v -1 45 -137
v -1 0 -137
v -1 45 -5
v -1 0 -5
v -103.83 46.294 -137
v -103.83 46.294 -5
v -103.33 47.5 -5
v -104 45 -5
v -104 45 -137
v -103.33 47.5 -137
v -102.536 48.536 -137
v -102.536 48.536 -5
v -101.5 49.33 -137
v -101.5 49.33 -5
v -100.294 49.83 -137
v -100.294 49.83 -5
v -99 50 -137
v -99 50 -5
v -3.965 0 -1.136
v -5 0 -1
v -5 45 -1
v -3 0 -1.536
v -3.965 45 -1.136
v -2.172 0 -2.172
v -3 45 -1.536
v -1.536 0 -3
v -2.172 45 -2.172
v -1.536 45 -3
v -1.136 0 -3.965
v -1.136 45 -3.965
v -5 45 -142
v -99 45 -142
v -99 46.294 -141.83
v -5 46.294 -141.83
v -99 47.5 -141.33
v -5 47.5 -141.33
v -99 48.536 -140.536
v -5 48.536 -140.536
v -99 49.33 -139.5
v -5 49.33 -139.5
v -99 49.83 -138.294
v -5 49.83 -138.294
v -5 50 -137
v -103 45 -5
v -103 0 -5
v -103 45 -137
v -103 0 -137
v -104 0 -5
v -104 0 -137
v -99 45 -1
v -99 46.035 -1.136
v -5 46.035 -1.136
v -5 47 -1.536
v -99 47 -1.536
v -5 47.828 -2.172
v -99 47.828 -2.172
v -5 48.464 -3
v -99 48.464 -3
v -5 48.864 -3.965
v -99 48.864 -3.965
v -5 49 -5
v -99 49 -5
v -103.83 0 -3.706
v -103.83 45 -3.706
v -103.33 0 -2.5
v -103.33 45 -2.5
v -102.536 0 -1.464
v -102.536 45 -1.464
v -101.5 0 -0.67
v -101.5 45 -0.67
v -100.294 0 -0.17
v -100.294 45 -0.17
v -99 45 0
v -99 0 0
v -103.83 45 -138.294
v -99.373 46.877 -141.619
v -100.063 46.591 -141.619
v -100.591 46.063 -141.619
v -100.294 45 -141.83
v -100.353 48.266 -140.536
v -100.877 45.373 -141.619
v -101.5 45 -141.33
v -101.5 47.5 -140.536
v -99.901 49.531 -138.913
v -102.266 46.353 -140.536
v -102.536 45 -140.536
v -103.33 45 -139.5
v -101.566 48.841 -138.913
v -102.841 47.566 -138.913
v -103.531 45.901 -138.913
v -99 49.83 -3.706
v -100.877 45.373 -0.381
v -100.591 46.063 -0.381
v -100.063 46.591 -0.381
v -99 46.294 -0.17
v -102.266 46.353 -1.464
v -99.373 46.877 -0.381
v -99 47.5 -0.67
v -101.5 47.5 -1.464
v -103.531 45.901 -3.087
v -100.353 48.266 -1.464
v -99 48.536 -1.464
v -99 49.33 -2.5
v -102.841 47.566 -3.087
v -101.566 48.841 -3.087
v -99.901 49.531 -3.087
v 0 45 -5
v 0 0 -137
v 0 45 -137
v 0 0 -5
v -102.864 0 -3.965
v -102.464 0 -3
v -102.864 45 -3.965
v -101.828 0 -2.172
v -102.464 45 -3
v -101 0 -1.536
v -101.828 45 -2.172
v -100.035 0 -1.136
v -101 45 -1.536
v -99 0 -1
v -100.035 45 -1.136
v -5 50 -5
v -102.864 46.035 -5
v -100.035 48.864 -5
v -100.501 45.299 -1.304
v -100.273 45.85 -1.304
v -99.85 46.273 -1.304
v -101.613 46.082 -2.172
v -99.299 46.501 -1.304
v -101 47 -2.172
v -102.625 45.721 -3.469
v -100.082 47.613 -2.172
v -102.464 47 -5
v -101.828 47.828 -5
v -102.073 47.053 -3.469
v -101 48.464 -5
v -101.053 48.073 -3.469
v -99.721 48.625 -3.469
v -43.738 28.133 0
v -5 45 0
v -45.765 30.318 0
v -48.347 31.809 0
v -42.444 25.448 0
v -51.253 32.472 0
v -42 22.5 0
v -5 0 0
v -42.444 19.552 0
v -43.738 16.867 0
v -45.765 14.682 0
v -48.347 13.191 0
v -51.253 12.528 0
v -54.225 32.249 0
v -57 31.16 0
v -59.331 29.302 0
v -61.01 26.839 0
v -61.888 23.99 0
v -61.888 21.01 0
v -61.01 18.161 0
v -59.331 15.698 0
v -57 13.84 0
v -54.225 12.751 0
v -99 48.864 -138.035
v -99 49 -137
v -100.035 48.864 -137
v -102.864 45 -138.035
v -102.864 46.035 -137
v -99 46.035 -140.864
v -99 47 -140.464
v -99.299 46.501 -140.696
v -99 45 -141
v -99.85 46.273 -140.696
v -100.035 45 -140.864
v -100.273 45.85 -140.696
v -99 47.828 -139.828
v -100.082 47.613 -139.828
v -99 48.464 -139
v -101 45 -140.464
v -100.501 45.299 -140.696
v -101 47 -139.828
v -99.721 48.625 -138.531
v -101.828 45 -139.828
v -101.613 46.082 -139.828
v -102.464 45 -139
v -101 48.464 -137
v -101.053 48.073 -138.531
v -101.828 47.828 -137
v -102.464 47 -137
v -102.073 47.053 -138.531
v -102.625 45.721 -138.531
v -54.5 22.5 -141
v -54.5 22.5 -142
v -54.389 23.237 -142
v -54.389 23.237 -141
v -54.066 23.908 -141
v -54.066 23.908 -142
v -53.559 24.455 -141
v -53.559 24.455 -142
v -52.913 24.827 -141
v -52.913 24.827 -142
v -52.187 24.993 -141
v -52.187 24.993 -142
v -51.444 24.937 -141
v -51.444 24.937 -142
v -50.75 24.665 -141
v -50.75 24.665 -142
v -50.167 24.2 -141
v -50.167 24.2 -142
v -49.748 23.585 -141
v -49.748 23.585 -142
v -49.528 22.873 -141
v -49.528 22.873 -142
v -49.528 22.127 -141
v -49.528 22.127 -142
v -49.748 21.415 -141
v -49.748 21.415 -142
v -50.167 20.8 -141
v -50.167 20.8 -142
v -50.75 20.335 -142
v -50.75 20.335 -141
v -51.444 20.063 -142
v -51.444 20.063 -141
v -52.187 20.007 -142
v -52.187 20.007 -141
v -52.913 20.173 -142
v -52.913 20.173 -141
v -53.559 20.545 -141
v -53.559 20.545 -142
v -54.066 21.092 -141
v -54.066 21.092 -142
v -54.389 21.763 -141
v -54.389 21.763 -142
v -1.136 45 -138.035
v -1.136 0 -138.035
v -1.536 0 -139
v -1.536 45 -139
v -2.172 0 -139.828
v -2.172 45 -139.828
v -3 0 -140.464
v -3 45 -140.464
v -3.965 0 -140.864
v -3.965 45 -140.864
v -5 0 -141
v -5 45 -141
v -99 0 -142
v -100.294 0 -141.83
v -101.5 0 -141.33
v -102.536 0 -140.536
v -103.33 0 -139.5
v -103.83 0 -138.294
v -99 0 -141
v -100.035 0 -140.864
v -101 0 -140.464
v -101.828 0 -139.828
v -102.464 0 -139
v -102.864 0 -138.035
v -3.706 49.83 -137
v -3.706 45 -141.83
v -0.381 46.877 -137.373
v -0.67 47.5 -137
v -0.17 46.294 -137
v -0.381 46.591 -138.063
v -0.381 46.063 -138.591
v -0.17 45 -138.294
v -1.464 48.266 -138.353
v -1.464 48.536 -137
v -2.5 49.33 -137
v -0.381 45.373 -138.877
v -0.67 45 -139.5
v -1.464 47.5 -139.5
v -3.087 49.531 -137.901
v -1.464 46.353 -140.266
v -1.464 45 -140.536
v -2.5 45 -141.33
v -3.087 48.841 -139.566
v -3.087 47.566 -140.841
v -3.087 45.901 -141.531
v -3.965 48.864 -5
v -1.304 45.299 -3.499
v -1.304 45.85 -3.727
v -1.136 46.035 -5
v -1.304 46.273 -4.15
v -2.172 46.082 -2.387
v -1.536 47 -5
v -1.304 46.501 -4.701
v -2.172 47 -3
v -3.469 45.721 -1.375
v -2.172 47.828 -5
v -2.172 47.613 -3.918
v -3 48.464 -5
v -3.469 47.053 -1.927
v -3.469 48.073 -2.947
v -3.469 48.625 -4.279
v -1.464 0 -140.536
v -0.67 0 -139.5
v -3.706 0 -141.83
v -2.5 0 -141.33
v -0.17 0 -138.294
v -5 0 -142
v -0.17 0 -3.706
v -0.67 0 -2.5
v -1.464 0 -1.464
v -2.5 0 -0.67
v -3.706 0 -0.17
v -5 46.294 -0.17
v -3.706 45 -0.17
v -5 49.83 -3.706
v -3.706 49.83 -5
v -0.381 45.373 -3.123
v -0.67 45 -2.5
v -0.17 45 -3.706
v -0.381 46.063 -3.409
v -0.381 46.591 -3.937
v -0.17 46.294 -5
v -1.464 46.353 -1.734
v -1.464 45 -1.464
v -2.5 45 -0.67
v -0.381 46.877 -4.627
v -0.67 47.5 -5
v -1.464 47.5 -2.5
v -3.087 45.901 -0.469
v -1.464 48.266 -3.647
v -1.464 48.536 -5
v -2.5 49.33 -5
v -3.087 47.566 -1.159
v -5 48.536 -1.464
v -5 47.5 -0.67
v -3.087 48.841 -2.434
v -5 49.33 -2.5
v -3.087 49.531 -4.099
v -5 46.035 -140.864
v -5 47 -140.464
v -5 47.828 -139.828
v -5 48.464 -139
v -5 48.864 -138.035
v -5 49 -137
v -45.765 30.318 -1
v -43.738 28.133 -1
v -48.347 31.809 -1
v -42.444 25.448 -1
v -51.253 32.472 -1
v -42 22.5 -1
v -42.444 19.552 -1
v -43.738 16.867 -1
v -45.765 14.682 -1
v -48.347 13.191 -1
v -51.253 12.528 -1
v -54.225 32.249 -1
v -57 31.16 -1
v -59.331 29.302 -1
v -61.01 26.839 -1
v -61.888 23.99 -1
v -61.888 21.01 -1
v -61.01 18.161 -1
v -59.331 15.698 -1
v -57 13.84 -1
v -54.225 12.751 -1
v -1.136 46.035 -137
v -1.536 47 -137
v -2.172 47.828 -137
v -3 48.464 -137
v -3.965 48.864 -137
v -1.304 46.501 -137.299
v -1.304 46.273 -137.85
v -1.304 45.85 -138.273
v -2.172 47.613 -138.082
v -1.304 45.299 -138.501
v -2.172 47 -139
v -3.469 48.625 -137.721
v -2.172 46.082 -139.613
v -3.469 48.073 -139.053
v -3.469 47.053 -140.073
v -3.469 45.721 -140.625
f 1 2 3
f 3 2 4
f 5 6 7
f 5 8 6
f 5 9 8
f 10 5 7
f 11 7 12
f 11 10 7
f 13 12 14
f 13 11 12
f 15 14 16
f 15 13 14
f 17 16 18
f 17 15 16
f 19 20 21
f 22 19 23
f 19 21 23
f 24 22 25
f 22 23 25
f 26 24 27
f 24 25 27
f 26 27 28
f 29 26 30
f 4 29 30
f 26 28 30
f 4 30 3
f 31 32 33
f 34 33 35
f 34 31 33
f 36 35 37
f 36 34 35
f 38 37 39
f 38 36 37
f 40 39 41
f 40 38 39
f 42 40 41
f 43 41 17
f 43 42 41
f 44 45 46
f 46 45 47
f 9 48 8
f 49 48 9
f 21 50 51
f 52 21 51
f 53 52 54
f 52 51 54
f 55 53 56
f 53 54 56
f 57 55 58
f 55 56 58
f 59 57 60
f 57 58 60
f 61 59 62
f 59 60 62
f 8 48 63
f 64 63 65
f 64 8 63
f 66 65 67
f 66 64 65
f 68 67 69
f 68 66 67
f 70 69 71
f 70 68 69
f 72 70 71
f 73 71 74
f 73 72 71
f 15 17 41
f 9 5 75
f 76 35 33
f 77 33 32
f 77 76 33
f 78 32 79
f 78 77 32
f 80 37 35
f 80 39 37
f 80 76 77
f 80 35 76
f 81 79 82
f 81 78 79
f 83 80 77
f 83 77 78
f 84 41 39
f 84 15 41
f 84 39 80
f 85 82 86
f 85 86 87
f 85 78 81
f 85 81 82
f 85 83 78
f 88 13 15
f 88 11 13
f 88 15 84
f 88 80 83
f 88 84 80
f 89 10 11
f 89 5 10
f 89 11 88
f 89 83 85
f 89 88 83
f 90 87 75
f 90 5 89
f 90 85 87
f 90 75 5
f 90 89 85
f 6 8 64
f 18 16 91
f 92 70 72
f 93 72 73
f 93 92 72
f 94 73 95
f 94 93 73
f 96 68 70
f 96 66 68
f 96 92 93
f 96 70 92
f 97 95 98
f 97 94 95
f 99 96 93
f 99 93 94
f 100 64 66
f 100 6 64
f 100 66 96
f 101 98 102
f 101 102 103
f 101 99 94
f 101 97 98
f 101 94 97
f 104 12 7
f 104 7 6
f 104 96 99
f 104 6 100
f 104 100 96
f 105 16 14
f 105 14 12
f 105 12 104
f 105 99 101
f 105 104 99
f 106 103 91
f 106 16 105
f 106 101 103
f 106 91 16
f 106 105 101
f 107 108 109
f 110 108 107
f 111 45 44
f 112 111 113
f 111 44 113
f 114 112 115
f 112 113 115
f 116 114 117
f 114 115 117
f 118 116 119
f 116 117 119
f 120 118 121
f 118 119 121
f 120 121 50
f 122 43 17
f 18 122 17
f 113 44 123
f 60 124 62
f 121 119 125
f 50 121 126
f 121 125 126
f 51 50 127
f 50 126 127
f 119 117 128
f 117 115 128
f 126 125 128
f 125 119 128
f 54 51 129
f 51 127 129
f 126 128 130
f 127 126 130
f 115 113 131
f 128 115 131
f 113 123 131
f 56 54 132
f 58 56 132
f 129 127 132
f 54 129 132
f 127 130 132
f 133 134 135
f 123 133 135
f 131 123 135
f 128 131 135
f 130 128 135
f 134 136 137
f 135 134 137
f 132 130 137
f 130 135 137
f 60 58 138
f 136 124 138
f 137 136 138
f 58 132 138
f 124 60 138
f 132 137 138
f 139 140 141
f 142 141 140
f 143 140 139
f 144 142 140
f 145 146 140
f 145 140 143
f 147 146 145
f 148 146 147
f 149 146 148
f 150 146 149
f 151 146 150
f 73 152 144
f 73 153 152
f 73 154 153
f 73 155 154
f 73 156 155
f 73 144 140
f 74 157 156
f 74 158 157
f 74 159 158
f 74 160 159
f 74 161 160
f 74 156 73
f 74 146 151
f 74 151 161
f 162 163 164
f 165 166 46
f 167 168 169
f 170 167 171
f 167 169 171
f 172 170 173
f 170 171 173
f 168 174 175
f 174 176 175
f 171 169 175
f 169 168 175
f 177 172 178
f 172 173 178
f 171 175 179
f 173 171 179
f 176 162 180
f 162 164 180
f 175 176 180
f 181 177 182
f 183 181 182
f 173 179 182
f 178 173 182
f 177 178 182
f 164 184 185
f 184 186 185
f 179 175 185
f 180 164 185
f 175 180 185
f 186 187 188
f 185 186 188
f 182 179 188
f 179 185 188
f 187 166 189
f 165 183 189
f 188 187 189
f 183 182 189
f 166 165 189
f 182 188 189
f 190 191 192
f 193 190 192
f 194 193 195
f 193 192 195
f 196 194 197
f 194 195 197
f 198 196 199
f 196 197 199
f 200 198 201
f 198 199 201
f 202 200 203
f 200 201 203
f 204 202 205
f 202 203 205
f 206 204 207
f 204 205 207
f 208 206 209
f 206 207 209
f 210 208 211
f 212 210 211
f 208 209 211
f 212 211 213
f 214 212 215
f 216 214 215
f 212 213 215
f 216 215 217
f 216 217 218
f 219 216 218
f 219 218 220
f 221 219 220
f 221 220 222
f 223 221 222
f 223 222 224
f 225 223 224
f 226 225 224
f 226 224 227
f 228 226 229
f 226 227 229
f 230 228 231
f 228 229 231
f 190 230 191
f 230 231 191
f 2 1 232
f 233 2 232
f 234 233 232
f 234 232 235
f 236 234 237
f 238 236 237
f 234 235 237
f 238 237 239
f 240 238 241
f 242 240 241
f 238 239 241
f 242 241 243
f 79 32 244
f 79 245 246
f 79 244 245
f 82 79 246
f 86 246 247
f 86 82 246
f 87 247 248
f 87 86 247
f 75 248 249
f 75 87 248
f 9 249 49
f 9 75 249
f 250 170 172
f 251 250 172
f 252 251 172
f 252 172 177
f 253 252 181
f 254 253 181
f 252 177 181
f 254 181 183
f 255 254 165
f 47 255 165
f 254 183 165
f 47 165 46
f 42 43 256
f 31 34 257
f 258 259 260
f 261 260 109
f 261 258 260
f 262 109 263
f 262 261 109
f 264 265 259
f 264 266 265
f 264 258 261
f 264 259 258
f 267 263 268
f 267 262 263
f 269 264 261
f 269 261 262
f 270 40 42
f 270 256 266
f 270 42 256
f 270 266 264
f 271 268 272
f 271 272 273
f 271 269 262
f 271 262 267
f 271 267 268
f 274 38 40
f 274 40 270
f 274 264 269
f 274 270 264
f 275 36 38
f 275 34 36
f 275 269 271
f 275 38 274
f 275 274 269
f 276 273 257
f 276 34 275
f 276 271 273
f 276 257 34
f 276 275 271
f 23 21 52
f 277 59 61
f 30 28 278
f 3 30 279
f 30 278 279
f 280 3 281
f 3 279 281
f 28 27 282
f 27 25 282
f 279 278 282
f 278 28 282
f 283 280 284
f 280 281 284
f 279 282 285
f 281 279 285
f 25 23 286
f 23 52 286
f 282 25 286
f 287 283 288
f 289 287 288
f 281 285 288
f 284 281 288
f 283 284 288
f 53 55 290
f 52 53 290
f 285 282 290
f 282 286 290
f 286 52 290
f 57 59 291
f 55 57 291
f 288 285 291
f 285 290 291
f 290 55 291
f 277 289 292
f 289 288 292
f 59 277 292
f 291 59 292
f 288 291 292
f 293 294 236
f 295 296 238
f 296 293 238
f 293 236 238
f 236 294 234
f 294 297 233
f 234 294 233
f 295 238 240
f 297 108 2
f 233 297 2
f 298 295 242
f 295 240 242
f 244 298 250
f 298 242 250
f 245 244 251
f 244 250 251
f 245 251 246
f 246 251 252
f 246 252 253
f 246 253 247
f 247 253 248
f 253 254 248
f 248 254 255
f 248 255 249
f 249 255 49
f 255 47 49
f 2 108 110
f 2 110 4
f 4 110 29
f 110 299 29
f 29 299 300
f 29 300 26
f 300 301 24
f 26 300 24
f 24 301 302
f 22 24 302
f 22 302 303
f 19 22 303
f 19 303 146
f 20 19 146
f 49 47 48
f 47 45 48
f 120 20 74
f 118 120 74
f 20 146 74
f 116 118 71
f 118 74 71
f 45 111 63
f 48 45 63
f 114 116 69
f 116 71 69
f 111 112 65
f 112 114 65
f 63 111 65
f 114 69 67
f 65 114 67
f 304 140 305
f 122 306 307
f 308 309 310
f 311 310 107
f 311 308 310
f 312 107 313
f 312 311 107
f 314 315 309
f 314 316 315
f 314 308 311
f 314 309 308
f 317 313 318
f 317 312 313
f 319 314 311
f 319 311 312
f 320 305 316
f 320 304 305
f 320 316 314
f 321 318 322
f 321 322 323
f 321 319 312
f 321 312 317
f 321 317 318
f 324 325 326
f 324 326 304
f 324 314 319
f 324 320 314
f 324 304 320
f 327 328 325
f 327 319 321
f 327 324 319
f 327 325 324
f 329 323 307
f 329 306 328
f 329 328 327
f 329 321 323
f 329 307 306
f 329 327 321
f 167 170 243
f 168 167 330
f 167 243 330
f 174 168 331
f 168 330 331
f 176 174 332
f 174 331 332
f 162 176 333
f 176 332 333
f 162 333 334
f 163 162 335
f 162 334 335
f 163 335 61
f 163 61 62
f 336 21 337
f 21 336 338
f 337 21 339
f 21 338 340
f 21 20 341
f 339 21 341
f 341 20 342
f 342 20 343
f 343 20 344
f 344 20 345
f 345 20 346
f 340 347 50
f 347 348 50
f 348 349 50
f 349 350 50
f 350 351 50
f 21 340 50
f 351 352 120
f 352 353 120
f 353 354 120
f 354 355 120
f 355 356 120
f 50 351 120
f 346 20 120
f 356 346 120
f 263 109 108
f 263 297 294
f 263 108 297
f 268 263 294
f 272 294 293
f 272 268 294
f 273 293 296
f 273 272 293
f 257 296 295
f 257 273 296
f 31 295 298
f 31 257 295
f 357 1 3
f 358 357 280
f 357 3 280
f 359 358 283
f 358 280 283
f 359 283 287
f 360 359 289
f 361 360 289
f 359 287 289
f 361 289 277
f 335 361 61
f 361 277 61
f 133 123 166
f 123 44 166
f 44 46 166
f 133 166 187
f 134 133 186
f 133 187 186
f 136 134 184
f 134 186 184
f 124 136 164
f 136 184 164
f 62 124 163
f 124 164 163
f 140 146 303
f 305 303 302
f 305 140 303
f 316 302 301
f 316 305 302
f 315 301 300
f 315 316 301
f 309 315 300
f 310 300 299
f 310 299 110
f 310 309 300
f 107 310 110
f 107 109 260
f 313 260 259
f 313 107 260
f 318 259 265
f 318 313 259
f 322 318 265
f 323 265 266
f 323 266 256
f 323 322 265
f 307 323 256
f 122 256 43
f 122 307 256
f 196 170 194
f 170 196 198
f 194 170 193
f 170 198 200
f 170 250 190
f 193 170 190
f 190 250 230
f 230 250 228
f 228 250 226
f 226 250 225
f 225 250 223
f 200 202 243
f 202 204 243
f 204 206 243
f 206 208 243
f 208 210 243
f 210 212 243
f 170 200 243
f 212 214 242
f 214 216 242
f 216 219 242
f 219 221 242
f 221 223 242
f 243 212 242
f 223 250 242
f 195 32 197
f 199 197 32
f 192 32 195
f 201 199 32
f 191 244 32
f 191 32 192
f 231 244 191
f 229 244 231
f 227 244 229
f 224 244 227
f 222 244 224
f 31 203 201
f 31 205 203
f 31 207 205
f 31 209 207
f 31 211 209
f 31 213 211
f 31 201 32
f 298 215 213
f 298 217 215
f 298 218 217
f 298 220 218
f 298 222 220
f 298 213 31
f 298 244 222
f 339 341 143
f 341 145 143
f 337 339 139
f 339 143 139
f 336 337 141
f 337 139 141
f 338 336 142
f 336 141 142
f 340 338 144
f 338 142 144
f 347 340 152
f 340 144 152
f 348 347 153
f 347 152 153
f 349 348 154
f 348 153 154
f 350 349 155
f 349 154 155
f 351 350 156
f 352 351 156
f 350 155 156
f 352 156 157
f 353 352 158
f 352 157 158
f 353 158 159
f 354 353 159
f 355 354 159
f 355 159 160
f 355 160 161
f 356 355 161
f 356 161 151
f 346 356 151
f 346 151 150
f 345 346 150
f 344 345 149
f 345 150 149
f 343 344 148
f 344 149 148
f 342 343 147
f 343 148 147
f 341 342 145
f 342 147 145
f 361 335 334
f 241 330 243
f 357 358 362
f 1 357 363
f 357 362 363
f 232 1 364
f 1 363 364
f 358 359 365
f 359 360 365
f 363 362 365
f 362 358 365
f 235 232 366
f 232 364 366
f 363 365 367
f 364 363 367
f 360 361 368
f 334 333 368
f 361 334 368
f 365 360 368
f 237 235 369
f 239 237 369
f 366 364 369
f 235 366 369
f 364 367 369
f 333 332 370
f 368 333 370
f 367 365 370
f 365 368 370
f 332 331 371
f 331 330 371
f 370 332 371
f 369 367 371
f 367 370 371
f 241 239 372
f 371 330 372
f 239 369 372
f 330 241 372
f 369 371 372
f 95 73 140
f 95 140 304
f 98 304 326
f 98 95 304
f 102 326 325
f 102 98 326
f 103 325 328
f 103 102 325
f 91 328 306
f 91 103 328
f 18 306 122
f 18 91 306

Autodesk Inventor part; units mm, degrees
ref_plane "YZ Plane" through (0, 0, 0) normal (1, 0, 0) x (0, 1, 0)
ref_plane "XZ Plane" through (0, 0, 0) normal (0, 1, 0) x (-1, 0, 0)
ref_plane "XY Plane" through (0, 0, 0) normal (0, 0, 1) x (1, 0, 0)
sketch "Sketch1" plane through (0, 0, 0) normal (0, 1, 0) x (-1, 0, 0)
  line L0 (0, 0) -> (104, 0)
  line L1 (104, 0) -> (104, -142)
  line L2 (104, -142) -> (0, -142)
  line L3 (0, -142) -> (0, 0)
  dimension "d0" = 142
  dimension "d1" = 104
extrude "Extrusion1" add sketch "Sketch1" along normal blind 50
fillet "Fillet1" radius 5 8 edges at (-104, 50, -71) (-52, 50, 0) (-52, 50, -142) (0, 50, -71) (0, 25, 0) (0, 25, -142) (-104, 25, 0) (-104, 25, -142)
shell "Shell1" thickness 1 removed faces 1 at (-34.6667, 0, -93)
sketch "Sketch2" plane through (-99, 0, 0) normal (0, 0, 1) x (1, 0, 0)
  line L0 (94, 45) -> (94, 0) projected
  line L1 (0, 45) -> (94, 45) projected
  line L2 (0, 0) -> (0, 45) projected
  line L3 (0, 0) -> (94, 0) projected
  circle A0 centre (47, 22.5) radius 10
  point P0 (99, 0)
  dimension "d6" = 20
extrude "Extrusion2" cut sketch "Sketch2" against normal blind 50 contours A0
sketch "Sketch3" plane through (-5, 0, -142) normal (0, 0, -1) x (-1, 0, 0)
  line L0 (0, 0) -> (0, 45) projected
  line L1 (0, 0) -> (94, 0) projected
  line L2 (94, 45) -> (94, 0) projected
  line L3 (0, 45) -> (94, 45) projected
  circle A0 centre (47, 22.5) radius 2.5
  point P0 (-5, 0)
  dimension "d9" = 5
extrude "Extrusion3" cut sketch "Sketch3" against normal blind 50 contours A0
properties part number "aja arduino 2"
